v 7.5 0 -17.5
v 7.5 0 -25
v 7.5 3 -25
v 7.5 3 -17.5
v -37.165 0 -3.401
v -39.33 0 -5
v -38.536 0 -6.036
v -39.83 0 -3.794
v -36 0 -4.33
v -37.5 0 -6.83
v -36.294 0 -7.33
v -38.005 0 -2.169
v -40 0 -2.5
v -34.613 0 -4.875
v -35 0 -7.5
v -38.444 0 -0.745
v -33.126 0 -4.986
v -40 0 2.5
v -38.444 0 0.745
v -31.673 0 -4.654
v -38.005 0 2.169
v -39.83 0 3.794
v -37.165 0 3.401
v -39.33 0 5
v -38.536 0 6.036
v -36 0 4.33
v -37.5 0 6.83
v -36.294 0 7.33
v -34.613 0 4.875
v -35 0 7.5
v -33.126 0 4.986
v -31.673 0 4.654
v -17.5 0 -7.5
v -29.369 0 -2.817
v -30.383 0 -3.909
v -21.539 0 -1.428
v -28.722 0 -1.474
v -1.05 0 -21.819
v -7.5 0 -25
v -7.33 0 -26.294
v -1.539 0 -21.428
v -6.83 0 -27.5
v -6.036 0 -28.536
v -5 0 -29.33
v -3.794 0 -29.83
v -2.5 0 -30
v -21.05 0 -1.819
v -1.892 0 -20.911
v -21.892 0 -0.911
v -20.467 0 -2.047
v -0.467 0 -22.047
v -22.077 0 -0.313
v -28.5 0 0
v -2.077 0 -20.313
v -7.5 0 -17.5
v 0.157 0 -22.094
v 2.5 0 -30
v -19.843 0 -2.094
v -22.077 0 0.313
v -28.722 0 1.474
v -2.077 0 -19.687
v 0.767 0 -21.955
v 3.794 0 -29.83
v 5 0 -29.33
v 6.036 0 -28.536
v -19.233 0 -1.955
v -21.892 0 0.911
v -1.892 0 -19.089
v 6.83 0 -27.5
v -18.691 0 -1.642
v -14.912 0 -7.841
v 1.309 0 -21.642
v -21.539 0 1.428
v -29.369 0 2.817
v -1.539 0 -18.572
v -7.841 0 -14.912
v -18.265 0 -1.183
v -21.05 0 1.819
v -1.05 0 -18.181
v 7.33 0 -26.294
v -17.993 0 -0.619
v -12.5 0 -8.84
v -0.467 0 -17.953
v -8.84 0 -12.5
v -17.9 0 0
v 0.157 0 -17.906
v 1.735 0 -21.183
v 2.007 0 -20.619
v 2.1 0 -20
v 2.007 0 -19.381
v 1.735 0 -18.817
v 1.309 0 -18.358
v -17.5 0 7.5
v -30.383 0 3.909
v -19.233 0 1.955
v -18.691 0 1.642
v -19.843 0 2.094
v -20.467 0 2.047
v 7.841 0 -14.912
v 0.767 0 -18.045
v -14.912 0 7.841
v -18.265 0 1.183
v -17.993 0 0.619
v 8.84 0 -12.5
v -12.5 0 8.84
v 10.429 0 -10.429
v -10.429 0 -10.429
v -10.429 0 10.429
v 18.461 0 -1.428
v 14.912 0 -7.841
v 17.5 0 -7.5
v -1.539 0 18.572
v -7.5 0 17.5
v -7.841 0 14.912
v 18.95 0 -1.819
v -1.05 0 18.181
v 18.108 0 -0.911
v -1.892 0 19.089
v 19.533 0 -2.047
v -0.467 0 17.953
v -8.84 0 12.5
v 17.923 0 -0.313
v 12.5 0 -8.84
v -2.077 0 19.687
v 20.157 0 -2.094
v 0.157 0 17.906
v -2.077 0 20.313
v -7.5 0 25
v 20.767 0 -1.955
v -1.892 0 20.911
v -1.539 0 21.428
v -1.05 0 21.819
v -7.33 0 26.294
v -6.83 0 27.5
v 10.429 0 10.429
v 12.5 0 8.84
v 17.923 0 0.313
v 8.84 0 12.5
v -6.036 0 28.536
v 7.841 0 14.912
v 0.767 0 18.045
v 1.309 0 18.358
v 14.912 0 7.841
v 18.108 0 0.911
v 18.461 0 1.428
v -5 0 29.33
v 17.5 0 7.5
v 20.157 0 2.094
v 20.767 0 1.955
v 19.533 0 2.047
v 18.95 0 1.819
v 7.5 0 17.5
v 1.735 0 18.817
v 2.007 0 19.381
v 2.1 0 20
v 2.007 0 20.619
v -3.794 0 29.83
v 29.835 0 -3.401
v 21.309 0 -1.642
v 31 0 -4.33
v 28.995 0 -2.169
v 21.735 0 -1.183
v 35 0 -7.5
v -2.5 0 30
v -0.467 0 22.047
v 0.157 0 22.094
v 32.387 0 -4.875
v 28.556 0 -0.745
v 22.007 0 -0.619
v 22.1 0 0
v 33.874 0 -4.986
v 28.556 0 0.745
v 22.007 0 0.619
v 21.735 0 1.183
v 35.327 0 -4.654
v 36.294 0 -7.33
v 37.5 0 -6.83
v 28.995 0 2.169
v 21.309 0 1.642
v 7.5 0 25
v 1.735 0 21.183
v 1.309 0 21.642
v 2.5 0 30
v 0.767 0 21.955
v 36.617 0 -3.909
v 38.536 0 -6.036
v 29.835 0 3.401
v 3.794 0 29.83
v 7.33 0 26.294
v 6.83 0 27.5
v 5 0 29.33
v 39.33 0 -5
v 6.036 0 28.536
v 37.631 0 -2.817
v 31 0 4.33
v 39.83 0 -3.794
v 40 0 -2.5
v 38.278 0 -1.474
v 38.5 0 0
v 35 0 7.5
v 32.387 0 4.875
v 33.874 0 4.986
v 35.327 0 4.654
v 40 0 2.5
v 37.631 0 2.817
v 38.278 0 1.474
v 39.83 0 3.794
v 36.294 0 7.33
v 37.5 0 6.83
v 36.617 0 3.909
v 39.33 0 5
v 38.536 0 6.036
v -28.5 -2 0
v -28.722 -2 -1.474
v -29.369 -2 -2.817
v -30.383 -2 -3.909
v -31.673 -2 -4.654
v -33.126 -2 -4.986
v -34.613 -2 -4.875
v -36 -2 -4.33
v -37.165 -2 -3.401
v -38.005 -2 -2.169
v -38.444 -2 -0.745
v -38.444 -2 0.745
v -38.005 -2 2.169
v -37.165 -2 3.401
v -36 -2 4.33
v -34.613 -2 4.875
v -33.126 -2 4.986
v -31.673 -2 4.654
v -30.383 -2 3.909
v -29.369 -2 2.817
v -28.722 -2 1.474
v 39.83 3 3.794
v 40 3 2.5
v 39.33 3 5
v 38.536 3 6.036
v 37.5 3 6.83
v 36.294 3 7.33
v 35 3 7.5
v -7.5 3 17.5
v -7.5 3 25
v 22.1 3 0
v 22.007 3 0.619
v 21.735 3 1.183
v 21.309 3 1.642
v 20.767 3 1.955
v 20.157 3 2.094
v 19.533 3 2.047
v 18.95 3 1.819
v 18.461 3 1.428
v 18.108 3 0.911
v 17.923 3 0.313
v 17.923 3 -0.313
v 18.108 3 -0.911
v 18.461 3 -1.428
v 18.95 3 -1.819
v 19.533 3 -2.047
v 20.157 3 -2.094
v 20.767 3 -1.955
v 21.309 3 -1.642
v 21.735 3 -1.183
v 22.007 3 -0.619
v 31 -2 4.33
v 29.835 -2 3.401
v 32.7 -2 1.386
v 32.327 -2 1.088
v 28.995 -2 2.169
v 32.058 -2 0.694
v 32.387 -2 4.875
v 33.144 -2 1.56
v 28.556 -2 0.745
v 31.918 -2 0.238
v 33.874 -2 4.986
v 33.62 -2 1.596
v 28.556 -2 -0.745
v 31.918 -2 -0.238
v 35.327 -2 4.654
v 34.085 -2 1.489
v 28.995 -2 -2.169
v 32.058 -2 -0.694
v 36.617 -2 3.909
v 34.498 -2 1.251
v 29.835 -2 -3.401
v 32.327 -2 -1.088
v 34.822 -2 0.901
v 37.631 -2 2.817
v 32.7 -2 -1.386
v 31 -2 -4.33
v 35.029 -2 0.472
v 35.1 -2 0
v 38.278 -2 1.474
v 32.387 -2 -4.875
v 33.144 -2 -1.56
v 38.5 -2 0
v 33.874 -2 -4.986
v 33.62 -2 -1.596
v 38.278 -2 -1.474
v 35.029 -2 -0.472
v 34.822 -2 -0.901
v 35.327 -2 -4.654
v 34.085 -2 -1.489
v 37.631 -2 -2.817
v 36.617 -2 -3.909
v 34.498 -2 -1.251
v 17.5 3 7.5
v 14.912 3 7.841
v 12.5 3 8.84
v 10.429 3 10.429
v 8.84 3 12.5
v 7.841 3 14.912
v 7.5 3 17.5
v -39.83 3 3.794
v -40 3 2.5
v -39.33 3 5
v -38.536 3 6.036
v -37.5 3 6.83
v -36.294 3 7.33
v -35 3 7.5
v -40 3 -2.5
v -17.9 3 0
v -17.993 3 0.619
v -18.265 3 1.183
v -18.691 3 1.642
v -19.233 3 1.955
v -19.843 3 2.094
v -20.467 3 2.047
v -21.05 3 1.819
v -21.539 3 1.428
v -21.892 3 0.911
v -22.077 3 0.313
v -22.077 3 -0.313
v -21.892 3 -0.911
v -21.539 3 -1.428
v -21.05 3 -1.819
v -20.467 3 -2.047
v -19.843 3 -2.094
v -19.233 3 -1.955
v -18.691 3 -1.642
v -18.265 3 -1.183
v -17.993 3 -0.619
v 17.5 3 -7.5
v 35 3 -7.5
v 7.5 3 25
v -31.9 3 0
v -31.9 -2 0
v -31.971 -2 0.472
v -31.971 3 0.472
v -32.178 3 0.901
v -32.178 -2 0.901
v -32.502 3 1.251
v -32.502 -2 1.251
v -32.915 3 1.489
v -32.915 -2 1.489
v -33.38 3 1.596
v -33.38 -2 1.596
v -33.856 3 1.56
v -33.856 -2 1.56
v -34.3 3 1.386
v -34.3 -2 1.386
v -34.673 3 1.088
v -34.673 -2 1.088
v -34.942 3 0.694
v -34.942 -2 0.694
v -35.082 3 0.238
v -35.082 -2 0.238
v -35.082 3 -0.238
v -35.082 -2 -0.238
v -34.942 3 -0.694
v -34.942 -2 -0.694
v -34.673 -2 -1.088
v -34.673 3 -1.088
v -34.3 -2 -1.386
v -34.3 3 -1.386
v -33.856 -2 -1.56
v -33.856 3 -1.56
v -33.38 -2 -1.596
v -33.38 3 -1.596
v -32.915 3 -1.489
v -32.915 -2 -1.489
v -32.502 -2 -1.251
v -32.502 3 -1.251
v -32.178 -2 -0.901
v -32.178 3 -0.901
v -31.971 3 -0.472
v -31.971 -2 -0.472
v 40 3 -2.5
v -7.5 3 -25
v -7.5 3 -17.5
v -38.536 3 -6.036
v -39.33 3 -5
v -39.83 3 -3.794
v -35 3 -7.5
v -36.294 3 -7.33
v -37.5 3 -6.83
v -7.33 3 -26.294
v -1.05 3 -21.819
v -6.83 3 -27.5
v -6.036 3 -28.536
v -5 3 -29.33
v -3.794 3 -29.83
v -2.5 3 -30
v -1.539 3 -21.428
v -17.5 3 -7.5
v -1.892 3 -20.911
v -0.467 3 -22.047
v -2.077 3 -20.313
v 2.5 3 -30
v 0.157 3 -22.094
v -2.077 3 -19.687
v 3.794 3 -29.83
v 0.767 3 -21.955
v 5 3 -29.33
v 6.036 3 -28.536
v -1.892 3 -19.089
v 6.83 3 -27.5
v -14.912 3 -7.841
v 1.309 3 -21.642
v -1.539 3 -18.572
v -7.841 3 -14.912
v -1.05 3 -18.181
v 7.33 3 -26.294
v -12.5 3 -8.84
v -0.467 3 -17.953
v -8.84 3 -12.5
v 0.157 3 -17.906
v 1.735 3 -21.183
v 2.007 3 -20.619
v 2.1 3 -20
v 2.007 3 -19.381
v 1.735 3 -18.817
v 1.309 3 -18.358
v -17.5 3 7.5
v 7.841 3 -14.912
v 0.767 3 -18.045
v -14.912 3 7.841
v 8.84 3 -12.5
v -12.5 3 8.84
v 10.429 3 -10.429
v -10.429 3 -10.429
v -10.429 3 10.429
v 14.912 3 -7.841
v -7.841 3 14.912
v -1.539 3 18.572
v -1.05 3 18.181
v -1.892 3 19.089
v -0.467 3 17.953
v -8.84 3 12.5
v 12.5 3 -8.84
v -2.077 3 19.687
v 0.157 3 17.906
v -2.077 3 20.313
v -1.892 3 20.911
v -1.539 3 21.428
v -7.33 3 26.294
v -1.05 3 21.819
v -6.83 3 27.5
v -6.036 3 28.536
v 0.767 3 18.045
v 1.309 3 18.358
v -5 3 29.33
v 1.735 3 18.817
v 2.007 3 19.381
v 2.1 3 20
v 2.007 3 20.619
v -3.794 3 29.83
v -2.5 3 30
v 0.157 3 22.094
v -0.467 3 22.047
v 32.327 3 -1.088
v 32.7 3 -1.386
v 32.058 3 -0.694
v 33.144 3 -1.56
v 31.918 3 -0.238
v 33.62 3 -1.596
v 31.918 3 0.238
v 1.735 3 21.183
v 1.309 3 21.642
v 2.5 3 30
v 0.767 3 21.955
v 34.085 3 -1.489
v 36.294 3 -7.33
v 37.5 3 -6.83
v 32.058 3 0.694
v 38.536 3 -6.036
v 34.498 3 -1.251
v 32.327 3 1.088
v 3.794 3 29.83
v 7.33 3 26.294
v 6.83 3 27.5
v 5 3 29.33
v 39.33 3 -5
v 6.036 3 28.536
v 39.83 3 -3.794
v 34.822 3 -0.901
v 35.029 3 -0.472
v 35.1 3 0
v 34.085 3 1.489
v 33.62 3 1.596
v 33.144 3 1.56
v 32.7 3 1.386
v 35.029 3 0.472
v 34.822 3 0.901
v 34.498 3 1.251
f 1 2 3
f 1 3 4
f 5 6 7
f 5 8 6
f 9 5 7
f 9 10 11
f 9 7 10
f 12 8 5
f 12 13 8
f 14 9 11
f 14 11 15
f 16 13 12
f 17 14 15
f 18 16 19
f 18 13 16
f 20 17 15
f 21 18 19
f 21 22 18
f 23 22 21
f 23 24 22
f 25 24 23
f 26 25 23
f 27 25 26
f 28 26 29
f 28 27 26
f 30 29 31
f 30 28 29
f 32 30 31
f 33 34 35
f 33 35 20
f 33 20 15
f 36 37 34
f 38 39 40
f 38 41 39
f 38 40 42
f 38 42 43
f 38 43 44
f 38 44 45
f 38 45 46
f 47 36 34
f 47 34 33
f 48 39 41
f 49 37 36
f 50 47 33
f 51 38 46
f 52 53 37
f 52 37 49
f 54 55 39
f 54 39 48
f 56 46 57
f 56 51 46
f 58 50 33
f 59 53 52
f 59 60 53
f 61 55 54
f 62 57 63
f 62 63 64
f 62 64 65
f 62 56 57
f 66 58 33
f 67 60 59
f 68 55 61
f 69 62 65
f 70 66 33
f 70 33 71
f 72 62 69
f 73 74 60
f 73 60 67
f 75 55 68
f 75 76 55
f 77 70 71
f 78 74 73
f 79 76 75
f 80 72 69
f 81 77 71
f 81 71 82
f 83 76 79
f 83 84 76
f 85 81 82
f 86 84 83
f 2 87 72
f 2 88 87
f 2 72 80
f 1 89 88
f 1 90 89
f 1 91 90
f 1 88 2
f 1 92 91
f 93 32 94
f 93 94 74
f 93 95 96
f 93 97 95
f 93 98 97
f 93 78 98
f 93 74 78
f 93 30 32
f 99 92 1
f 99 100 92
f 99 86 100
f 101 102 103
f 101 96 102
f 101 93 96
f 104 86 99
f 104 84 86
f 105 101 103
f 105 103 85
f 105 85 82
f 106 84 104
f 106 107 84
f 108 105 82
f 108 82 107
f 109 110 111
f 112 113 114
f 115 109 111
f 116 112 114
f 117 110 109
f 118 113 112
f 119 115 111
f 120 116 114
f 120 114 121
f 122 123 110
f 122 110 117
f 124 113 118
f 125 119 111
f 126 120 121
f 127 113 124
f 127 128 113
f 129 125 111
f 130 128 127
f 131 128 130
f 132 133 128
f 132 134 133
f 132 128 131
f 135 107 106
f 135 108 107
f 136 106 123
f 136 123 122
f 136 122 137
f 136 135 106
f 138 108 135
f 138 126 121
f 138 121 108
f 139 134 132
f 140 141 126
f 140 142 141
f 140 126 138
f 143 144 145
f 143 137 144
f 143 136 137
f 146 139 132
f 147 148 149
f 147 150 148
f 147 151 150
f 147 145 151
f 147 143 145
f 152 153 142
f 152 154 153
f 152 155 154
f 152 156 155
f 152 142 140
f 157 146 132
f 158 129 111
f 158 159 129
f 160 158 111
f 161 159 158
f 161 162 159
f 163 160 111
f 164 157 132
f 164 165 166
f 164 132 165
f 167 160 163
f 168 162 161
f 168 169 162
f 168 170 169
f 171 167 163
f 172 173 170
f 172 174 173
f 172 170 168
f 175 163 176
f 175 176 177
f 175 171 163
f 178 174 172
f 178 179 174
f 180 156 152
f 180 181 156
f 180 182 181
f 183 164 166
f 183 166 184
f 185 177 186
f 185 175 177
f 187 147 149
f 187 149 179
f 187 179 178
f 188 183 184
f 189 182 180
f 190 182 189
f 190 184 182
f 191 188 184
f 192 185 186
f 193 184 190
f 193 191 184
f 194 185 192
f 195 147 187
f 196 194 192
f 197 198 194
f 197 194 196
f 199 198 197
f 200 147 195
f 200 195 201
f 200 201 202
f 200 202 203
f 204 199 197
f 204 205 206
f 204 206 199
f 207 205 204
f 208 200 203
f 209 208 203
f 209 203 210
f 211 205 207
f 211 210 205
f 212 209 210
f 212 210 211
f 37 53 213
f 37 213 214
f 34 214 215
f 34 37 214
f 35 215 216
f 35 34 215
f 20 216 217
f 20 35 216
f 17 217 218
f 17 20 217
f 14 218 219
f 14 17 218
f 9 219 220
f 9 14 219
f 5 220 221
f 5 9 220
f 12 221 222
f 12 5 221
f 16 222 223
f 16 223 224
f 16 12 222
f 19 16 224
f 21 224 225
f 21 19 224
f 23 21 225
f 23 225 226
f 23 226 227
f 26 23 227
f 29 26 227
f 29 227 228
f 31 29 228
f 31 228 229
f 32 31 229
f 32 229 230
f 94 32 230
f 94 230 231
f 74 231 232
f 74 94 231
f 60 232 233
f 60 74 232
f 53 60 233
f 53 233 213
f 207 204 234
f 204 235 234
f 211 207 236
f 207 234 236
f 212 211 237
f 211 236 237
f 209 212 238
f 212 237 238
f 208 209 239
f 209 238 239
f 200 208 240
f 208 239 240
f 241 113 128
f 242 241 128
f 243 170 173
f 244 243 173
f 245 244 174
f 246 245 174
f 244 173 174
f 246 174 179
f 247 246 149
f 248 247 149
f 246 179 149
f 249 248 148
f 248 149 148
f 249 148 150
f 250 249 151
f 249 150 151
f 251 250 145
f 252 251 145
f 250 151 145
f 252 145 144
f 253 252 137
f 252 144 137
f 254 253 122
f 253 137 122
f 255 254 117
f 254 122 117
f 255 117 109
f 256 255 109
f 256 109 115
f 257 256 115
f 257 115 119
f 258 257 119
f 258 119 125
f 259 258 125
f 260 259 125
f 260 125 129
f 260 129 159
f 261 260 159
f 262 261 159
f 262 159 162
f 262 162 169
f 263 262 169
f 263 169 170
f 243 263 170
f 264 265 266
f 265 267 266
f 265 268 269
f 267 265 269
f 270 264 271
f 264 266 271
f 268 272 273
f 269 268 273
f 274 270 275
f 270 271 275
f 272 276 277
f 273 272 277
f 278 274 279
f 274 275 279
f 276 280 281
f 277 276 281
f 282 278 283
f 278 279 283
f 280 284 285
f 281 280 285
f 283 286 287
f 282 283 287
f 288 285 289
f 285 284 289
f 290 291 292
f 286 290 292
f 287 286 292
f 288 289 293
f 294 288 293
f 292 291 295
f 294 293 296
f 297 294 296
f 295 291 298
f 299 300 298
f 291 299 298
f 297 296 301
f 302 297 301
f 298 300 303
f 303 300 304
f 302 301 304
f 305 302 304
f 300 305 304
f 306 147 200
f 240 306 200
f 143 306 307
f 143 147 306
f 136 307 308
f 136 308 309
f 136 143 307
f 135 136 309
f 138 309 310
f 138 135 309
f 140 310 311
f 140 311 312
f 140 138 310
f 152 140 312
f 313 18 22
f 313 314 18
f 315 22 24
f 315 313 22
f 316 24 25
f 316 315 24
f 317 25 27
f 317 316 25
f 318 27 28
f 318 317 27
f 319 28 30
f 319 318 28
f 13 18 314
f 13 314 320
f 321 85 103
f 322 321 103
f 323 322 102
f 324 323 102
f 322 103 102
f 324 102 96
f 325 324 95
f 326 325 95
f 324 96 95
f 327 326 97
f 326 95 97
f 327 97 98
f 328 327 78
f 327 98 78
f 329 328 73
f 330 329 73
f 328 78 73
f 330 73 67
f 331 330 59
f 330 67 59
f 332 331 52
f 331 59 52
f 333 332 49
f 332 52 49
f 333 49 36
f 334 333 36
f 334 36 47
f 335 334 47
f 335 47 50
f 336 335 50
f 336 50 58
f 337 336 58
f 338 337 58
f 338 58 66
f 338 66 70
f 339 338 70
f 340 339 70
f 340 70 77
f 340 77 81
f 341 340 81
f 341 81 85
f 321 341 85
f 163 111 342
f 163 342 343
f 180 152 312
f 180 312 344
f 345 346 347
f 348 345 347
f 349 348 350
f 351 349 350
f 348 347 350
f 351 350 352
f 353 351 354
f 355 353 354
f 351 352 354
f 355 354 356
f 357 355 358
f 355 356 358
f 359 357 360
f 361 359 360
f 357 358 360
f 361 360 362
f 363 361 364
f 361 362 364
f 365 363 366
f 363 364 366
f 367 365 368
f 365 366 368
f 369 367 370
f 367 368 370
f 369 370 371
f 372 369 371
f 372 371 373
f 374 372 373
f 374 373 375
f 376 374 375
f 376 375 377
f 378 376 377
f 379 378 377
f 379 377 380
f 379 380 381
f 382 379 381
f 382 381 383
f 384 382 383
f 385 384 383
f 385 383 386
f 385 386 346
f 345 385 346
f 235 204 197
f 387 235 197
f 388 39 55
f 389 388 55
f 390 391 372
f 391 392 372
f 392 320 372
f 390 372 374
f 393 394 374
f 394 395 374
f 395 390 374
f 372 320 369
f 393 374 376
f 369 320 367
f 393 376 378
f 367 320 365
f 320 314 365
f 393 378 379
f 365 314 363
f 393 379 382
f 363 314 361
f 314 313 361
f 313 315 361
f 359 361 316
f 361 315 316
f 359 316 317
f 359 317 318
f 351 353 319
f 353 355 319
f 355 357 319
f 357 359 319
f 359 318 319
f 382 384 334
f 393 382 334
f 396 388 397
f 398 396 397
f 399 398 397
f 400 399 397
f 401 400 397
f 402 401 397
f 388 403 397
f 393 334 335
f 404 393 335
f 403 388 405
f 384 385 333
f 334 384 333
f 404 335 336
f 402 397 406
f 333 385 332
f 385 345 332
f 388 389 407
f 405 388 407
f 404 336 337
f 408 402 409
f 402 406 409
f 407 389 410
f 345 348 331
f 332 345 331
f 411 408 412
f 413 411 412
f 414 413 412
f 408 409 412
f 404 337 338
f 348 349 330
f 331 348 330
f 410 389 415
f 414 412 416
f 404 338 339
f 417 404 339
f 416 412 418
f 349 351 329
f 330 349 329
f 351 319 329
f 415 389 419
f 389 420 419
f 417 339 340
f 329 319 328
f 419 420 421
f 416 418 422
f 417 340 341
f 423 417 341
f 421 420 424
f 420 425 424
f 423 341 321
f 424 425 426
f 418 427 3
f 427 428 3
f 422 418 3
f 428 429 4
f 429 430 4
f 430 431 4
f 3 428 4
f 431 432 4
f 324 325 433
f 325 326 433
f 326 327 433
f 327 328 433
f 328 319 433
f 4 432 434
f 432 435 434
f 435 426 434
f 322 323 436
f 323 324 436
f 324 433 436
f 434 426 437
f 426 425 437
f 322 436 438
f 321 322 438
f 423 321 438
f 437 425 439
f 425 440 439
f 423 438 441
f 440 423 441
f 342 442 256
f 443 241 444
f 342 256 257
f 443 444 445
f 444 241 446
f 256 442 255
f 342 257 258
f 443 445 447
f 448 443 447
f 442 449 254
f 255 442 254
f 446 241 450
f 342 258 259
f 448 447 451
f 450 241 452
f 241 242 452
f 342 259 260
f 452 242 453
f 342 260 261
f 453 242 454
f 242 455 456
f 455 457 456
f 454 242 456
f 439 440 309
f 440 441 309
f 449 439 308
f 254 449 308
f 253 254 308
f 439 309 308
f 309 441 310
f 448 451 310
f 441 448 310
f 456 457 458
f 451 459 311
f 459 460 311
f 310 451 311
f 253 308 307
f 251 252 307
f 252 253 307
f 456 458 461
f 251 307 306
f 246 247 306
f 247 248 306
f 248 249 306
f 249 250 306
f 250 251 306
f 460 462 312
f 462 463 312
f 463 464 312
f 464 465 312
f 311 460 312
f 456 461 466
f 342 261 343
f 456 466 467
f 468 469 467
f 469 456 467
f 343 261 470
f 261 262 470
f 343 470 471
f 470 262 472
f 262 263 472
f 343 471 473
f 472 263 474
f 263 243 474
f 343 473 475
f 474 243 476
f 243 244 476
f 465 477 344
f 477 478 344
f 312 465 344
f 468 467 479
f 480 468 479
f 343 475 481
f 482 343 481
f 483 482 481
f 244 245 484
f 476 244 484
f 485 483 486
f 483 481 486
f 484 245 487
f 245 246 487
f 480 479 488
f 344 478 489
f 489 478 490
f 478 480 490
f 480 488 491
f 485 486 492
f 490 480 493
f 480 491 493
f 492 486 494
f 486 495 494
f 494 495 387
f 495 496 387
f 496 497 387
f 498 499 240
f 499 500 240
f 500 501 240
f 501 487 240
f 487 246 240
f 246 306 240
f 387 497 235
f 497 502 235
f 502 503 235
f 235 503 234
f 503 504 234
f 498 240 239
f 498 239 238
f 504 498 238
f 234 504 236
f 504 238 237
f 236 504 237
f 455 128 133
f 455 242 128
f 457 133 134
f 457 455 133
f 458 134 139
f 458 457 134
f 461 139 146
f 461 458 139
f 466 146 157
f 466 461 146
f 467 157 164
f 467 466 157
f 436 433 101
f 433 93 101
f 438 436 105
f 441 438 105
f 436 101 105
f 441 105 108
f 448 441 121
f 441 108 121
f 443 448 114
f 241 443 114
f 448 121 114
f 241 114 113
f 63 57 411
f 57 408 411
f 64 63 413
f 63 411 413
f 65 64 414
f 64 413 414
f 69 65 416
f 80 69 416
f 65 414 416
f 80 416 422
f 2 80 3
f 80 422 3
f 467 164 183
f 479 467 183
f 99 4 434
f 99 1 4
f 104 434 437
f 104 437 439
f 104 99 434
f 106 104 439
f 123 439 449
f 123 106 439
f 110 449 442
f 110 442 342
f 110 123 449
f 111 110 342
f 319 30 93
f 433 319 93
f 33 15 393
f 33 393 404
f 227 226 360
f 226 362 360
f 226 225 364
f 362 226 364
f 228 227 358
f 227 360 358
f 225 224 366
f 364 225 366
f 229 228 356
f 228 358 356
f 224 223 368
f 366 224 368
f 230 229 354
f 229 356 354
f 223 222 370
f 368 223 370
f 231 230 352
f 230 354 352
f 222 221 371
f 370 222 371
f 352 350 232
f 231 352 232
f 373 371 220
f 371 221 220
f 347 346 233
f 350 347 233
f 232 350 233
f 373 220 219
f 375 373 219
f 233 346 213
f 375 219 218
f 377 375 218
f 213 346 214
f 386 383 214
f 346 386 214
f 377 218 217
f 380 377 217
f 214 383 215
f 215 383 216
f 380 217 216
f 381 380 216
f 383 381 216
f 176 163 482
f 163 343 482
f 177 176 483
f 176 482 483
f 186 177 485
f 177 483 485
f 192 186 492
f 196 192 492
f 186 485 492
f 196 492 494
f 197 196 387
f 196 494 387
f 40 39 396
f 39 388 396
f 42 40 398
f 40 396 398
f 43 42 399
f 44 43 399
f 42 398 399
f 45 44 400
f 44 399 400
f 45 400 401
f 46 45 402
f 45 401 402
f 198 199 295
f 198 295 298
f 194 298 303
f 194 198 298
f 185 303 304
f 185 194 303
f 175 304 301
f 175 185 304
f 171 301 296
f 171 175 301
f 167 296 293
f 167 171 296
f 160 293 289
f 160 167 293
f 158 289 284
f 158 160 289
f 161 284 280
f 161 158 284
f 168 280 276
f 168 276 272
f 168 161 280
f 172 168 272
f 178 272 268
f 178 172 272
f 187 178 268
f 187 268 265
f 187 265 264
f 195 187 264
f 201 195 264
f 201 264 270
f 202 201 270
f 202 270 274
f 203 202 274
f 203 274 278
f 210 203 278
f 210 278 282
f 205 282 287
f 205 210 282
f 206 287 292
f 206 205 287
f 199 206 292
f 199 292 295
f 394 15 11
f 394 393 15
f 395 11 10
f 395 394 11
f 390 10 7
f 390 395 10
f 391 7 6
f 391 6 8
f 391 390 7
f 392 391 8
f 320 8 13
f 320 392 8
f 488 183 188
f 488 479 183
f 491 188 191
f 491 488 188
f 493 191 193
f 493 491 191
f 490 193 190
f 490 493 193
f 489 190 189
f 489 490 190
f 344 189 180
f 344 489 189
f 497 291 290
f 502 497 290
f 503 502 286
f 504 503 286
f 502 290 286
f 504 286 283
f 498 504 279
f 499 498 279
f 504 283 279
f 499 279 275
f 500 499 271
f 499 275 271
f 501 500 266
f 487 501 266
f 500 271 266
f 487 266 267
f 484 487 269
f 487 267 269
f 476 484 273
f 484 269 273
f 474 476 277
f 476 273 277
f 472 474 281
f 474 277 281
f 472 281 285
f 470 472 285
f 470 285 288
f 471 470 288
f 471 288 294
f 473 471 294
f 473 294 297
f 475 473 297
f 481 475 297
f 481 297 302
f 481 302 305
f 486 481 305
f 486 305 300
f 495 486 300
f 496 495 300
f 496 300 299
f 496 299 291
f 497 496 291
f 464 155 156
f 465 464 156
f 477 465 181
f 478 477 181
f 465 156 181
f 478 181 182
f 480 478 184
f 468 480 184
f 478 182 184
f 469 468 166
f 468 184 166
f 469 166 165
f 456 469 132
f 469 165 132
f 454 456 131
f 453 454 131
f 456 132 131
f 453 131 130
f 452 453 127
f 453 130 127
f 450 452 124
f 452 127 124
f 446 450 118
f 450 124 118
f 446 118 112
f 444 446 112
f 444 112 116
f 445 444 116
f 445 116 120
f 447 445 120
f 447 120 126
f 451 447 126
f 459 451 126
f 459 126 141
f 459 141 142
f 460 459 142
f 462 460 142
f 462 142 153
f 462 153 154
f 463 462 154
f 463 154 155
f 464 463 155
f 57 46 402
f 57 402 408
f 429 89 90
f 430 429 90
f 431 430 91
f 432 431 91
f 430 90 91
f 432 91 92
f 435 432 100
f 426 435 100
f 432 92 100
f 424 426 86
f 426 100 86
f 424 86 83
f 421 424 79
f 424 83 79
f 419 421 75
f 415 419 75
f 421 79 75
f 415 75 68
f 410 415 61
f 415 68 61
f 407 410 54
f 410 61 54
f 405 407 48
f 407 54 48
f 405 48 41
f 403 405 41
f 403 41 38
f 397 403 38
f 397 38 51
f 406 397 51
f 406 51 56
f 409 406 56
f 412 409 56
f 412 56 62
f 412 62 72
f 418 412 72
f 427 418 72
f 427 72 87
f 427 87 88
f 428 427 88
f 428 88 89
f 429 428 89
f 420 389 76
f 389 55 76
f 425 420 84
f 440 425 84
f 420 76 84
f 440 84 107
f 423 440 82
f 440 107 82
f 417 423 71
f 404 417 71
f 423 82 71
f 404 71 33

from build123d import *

# Parameters (mm, degrees)
SKETCH_2_W          = 80
SKETCH_2_H          = 15
EXTRUDE_1_DEPTH     = 3
SKETCH_1_R          = 5
EXTRUDE_2_DEPTH     = 2
SKETCH_3_W          = 15
SKETCH_3_H          = 60
EXTRUDE_3_DEPTH     = 3
SKETCH_4_R          = 2.1
CUT_EXTRUDE_4_DEPTH = 4
SKETCH_5_R          = 2.1
CUT_EXTRUDE_5_DEPTH = 4
FILLET_2_R          = 5
SKETCH_6_R          = 1.6
CUT_EXTRUDE_6_DEPTH = 6
FILLET_3_R          = 10


with BuildPart() as part:
    # 草圖2 → 填料-伸長1 (new body)
    with BuildSketch(Plane(origin=(0, 0, 0), x_dir=(1, 0, 0), z_dir=(0, 1, 0))):
        Rectangle(SKETCH_2_W, SKETCH_2_H)
    extrude(amount=EXTRUDE_1_DEPTH)

    # 草圖1 → 填料-伸長2 (add)
    with BuildSketch(Plane(origin=(0, 0, 0), x_dir=(1, 0, 0), z_dir=(0, 1, 0))):
        with Locations((-33.5, 0)):
            Circle(SKETCH_1_R)
        with Locations((33.5, 0)):
            Circle(SKETCH_1_R)
    extrude(amount=-EXTRUDE_2_DEPTH)

    # 草圖3 → 填料-伸長3 (add)
    with BuildSketch(Plane.XZ):
        Rectangle(SKETCH_3_W, SKETCH_3_H)
    extrude(amount=-EXTRUDE_3_DEPTH)

    # 草圖4 → 除料-伸長4 (cut, through all)
    with BuildSketch(Plane.XZ):
        with Locations((0, 20)):
            Circle(SKETCH_4_R)
        with Locations((0, -20)):
            Circle(SKETCH_4_R)
    extrude(amount=-CUT_EXTRUDE_4_DEPTH, mode=Mode.SUBTRACT)

    # 草圖5 → 除料-伸長5 (cut, through all)
    with BuildSketch(Plane.XZ):
        with Locations((-20, 0)):
            Circle(SKETCH_5_R)
        with Locations((20, 0)):
            Circle(SKETCH_5_R)
    extrude(amount=-CUT_EXTRUDE_5_DEPTH, mode=Mode.SUBTRACT)

    # 圓角2
    fillet_2_edges = [part.edges().sort_by_distance(p)[0] for p in [
        (7.5, 1.5, 30),
        (-7.5, 1.5, -30),
        (7.5, 1.5, -30),
        (-7.5, 1.5, 30),
        (40, 1.5, 7.5),
        (-40, 1.5, 7.5),
        (-40, 1.5, -7.5),
        (40, 1.5, -7.5),
    ]]
    fillet(fillet_2_edges, radius=FILLET_2_R)

    # 草圖6 → 除料-伸長6 (cut, through all)
    with BuildSketch(Plane.XZ.offset(2)):
        with Locations((-33.5, 0)):
            Circle(SKETCH_6_R)
        with Locations((33.5, 0)):
            Circle(SKETCH_6_R)
    extrude(amount=-CUT_EXTRUDE_6_DEPTH, mode=Mode.SUBTRACT)

    # 圓角3
    fillet_3_edges = [part.edges().sort_by_distance(p)[0] for p in [
        (7.5, 1.5, -7.5),
        (7.5, 1.5, 7.5),
        (-7.5, 1.5, -7.5),
        (-7.5, 1.5, 7.5),
    ]]
    fillet(fillet_3_edges, radius=FILLET_3_R)


solid = part.part
